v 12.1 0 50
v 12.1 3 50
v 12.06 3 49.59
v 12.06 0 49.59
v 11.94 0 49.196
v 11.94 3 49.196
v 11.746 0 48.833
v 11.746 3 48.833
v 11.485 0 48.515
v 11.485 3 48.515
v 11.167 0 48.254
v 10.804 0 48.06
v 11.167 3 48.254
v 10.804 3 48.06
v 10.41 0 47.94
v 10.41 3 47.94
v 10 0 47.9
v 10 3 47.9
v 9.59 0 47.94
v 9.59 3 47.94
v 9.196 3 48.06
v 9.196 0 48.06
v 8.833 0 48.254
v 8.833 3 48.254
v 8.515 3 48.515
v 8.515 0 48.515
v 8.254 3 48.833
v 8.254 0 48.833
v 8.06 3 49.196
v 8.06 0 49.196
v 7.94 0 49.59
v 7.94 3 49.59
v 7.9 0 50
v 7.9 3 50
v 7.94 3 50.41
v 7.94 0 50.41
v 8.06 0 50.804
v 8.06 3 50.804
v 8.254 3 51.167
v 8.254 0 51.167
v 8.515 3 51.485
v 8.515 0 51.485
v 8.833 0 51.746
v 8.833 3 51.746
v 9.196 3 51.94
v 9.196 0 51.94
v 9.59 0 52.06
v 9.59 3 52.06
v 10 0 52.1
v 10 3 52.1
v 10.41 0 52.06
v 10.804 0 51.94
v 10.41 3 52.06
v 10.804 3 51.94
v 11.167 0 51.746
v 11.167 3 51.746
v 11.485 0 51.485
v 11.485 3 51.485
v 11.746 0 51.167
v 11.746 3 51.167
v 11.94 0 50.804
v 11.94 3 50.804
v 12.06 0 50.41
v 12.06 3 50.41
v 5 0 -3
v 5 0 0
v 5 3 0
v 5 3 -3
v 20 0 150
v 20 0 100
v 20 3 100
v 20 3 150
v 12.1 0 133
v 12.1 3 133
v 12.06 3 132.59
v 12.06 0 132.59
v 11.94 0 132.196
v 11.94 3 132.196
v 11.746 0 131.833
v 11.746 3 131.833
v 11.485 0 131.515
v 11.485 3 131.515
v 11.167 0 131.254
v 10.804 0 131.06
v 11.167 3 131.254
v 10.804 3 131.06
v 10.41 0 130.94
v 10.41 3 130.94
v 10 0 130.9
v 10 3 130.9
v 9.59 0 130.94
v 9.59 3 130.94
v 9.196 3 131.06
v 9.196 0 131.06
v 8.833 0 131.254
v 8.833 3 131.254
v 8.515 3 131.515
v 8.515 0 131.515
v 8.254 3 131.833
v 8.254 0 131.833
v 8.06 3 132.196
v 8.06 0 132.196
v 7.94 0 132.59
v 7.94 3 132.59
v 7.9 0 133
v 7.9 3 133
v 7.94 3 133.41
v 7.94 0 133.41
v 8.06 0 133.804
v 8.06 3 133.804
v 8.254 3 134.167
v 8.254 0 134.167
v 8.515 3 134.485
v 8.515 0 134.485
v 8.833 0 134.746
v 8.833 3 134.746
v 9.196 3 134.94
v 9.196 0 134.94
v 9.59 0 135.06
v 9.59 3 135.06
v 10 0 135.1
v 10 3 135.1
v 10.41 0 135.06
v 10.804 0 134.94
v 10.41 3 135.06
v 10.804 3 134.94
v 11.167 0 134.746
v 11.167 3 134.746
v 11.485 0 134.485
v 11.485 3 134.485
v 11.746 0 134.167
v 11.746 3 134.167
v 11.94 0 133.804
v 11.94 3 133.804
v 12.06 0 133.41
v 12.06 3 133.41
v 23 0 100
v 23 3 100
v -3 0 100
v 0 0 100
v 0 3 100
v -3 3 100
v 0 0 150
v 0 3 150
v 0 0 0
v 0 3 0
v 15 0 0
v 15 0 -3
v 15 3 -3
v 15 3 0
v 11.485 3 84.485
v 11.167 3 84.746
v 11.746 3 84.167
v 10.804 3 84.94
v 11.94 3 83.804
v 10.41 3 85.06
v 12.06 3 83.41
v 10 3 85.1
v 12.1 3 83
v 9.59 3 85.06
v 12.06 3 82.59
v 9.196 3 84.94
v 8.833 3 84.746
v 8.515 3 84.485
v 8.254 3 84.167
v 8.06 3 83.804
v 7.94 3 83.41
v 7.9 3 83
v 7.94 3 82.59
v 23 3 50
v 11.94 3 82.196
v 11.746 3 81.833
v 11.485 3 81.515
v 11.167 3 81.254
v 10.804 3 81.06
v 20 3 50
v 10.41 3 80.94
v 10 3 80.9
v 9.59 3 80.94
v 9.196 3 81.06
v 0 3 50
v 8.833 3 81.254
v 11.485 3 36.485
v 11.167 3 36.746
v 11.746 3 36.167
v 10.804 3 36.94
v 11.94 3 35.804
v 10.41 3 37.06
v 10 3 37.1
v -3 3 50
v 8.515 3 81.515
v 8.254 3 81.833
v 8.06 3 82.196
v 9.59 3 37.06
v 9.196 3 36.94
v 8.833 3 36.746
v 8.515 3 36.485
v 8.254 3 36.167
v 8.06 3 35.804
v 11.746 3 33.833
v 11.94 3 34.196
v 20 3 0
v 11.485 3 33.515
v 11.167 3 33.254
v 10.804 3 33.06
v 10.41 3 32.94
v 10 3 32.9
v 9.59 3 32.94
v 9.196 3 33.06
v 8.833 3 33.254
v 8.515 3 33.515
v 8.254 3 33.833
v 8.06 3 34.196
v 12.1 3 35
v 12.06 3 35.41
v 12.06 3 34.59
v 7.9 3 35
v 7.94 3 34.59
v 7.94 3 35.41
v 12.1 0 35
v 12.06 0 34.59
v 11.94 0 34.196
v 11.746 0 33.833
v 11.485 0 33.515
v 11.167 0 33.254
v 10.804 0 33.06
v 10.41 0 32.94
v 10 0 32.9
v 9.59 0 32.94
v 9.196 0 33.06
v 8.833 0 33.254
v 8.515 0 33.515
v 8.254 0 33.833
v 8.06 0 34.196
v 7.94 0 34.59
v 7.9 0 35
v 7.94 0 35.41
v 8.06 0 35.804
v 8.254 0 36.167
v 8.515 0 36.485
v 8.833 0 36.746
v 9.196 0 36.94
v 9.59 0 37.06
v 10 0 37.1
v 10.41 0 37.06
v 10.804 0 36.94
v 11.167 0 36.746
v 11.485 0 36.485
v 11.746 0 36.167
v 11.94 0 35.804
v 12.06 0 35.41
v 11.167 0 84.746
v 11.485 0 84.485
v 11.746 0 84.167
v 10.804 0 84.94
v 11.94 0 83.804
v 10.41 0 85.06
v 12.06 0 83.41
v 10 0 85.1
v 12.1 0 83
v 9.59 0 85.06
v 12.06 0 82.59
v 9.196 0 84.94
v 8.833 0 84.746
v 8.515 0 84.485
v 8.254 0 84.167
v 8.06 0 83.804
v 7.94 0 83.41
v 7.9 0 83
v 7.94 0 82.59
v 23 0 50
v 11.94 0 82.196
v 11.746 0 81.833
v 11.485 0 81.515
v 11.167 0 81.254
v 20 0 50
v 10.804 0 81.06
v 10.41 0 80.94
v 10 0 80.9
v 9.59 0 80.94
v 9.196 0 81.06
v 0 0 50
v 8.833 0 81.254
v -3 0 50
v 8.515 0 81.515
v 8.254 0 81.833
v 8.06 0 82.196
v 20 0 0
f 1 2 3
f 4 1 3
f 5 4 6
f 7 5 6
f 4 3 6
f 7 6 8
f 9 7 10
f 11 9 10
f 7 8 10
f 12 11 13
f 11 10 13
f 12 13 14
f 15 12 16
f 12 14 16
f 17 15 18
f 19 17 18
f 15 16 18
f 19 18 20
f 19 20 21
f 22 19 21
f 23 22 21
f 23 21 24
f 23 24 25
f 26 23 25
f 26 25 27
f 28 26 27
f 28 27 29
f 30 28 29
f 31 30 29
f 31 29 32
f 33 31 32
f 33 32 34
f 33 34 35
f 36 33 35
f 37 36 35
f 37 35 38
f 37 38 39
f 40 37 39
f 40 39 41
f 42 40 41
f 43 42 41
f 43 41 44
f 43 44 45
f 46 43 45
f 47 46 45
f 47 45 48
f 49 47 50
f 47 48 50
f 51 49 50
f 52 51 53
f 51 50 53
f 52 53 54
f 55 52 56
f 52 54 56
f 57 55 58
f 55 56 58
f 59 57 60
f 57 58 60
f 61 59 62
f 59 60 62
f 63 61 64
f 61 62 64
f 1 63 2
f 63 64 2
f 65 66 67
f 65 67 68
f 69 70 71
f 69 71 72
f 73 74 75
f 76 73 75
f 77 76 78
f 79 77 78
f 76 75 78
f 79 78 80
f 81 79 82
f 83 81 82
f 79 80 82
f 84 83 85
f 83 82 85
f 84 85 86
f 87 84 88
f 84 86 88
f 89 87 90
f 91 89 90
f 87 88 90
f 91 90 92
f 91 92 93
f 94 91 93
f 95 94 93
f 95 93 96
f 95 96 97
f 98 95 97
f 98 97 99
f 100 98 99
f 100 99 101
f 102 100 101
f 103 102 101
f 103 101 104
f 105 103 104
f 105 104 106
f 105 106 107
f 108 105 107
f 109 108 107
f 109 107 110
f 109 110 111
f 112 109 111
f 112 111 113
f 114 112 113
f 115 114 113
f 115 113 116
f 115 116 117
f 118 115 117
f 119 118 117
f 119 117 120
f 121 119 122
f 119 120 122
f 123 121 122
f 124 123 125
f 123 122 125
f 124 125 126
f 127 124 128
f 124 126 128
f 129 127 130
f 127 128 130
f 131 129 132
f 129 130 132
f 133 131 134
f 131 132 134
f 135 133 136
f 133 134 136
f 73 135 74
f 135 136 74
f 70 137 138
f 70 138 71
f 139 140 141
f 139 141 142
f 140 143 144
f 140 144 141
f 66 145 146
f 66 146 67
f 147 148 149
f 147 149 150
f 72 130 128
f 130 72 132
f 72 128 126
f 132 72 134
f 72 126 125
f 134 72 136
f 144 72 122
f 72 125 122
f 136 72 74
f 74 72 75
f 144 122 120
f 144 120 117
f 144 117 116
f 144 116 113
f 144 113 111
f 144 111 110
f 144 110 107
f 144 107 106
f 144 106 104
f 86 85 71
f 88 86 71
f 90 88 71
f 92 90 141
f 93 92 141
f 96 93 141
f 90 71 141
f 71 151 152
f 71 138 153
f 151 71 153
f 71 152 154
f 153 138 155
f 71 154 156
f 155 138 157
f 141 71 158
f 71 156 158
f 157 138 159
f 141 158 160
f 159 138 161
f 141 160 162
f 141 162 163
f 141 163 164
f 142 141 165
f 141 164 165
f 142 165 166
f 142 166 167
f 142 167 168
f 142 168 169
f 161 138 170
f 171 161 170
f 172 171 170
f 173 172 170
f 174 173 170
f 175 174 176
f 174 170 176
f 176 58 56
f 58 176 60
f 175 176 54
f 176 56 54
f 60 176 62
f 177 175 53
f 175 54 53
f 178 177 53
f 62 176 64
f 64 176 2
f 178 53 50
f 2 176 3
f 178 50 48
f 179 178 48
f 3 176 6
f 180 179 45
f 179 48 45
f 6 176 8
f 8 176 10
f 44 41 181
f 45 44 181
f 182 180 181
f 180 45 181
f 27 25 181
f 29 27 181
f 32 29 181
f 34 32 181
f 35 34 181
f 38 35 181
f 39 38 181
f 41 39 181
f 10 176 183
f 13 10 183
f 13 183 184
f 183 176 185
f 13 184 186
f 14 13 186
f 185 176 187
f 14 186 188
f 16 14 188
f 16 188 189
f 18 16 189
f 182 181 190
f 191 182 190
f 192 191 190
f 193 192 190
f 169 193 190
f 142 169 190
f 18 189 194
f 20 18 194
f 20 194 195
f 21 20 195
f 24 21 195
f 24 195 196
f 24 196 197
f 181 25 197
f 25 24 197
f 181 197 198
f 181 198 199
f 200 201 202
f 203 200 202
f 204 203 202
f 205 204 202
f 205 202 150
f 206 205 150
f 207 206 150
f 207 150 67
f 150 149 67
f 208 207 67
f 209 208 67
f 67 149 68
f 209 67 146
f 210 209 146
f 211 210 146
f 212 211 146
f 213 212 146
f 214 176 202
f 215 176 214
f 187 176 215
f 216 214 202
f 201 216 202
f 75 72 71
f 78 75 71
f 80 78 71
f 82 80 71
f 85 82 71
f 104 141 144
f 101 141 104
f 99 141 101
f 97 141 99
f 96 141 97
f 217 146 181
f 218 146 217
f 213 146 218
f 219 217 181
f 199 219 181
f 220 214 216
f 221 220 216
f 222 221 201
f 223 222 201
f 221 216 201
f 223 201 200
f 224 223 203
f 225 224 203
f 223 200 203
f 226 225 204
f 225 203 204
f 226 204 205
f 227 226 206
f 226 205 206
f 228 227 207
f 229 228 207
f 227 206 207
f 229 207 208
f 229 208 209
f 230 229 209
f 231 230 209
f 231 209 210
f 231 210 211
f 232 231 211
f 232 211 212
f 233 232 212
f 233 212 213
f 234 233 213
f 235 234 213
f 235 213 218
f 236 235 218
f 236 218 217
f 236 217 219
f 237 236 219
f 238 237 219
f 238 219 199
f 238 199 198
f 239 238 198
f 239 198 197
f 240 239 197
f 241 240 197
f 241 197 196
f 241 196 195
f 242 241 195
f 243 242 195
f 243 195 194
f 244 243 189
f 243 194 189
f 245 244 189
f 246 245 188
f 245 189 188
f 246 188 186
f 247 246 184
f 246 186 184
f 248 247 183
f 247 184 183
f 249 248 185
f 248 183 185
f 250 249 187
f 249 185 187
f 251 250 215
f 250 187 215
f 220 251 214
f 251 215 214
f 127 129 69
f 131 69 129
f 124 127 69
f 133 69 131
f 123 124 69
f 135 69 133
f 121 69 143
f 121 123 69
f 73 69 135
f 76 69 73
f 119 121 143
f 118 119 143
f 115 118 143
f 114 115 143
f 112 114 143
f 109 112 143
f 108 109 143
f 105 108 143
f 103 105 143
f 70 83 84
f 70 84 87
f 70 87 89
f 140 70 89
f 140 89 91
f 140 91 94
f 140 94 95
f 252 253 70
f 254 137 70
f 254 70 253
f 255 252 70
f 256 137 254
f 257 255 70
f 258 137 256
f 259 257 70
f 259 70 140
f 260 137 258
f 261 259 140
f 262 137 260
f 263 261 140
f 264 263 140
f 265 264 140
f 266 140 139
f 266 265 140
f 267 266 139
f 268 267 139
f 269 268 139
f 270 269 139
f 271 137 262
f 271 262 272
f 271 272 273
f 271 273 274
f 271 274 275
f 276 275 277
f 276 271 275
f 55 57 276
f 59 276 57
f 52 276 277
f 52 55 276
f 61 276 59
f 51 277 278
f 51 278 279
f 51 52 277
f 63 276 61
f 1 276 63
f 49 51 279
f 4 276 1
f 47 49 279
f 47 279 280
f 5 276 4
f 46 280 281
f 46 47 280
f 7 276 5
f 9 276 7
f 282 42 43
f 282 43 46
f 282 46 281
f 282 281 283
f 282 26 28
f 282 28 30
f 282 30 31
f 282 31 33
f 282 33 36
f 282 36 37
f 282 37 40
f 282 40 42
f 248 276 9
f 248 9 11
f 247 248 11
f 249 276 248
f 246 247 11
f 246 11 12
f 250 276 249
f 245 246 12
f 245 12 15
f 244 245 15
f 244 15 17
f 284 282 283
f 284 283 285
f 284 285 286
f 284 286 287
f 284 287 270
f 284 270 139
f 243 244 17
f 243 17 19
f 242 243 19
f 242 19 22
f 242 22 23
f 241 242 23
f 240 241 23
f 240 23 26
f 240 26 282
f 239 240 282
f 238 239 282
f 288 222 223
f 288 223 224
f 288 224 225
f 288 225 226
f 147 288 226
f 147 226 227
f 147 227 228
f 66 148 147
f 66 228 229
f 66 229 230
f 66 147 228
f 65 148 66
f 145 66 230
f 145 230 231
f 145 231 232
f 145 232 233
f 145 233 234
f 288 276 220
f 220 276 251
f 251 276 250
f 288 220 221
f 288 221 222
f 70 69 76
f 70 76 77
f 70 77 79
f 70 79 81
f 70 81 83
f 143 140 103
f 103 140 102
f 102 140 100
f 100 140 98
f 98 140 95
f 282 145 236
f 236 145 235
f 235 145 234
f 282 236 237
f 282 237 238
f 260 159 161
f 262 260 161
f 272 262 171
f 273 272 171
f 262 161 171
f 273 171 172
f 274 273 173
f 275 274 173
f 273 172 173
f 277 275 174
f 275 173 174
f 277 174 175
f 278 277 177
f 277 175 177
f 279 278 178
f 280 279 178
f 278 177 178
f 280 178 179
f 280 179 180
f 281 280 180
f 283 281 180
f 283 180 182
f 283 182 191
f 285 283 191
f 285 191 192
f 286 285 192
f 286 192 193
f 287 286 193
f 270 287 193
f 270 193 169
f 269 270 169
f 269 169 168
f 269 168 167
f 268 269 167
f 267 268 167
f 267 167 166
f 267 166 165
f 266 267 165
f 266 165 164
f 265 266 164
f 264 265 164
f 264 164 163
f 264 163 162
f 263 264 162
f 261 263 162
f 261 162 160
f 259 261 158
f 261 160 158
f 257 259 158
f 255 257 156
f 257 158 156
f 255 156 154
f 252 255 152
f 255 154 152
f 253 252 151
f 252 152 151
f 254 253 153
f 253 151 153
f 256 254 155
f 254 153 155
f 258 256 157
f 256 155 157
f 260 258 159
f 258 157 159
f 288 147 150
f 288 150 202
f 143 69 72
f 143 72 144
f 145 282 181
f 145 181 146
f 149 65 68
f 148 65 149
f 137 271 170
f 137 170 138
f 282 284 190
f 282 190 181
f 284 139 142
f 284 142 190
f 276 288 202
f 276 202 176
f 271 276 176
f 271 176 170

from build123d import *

# Parameters (mm, degrees)
BOSS_EXTRUDE1_DEPTH = 3
SKETCH2_R           = 2.1
CUT_EXTRUDE1_DEPTH  = 4


with BuildPart() as part:
    # Sketch1 → Boss-Extrude1 (new body)
    with BuildSketch(Plane(origin=(0, 0, 0), x_dir=(1, 0, 0), z_dir=(0, 1, 0))):
        Polygon((15, 0), (20, 0), (20, -50), (23, -50), (23, -100), (20, -100), (20, -150), (0, -150), (0, -100), (-3, -100), (-3, -50), (0, -50), (0, 0), (5, 0), (5, 3), (15, 3), align=None)
    extrude(amount=BOSS_EXTRUDE1_DEPTH)

    # Sketch2 → Cut-Extrude1 (cut, through all)
    with BuildSketch(Plane(origin=(0, 3, 0), x_dir=(1, 0, 0), z_dir=(0, 1, 0))):
        with Locations((10, -35)):
            Circle(SKETCH2_R)
        with Locations((10, -50)):
            Circle(SKETCH2_R)
        with Locations((10, -83)):
            Circle(SKETCH2_R)
        with Locations((10, -133)):
            Circle(SKETCH2_R)
    extrude(amount=-CUT_EXTRUDE1_DEPTH, mode=Mode.SUBTRACT)


solid = part.part
